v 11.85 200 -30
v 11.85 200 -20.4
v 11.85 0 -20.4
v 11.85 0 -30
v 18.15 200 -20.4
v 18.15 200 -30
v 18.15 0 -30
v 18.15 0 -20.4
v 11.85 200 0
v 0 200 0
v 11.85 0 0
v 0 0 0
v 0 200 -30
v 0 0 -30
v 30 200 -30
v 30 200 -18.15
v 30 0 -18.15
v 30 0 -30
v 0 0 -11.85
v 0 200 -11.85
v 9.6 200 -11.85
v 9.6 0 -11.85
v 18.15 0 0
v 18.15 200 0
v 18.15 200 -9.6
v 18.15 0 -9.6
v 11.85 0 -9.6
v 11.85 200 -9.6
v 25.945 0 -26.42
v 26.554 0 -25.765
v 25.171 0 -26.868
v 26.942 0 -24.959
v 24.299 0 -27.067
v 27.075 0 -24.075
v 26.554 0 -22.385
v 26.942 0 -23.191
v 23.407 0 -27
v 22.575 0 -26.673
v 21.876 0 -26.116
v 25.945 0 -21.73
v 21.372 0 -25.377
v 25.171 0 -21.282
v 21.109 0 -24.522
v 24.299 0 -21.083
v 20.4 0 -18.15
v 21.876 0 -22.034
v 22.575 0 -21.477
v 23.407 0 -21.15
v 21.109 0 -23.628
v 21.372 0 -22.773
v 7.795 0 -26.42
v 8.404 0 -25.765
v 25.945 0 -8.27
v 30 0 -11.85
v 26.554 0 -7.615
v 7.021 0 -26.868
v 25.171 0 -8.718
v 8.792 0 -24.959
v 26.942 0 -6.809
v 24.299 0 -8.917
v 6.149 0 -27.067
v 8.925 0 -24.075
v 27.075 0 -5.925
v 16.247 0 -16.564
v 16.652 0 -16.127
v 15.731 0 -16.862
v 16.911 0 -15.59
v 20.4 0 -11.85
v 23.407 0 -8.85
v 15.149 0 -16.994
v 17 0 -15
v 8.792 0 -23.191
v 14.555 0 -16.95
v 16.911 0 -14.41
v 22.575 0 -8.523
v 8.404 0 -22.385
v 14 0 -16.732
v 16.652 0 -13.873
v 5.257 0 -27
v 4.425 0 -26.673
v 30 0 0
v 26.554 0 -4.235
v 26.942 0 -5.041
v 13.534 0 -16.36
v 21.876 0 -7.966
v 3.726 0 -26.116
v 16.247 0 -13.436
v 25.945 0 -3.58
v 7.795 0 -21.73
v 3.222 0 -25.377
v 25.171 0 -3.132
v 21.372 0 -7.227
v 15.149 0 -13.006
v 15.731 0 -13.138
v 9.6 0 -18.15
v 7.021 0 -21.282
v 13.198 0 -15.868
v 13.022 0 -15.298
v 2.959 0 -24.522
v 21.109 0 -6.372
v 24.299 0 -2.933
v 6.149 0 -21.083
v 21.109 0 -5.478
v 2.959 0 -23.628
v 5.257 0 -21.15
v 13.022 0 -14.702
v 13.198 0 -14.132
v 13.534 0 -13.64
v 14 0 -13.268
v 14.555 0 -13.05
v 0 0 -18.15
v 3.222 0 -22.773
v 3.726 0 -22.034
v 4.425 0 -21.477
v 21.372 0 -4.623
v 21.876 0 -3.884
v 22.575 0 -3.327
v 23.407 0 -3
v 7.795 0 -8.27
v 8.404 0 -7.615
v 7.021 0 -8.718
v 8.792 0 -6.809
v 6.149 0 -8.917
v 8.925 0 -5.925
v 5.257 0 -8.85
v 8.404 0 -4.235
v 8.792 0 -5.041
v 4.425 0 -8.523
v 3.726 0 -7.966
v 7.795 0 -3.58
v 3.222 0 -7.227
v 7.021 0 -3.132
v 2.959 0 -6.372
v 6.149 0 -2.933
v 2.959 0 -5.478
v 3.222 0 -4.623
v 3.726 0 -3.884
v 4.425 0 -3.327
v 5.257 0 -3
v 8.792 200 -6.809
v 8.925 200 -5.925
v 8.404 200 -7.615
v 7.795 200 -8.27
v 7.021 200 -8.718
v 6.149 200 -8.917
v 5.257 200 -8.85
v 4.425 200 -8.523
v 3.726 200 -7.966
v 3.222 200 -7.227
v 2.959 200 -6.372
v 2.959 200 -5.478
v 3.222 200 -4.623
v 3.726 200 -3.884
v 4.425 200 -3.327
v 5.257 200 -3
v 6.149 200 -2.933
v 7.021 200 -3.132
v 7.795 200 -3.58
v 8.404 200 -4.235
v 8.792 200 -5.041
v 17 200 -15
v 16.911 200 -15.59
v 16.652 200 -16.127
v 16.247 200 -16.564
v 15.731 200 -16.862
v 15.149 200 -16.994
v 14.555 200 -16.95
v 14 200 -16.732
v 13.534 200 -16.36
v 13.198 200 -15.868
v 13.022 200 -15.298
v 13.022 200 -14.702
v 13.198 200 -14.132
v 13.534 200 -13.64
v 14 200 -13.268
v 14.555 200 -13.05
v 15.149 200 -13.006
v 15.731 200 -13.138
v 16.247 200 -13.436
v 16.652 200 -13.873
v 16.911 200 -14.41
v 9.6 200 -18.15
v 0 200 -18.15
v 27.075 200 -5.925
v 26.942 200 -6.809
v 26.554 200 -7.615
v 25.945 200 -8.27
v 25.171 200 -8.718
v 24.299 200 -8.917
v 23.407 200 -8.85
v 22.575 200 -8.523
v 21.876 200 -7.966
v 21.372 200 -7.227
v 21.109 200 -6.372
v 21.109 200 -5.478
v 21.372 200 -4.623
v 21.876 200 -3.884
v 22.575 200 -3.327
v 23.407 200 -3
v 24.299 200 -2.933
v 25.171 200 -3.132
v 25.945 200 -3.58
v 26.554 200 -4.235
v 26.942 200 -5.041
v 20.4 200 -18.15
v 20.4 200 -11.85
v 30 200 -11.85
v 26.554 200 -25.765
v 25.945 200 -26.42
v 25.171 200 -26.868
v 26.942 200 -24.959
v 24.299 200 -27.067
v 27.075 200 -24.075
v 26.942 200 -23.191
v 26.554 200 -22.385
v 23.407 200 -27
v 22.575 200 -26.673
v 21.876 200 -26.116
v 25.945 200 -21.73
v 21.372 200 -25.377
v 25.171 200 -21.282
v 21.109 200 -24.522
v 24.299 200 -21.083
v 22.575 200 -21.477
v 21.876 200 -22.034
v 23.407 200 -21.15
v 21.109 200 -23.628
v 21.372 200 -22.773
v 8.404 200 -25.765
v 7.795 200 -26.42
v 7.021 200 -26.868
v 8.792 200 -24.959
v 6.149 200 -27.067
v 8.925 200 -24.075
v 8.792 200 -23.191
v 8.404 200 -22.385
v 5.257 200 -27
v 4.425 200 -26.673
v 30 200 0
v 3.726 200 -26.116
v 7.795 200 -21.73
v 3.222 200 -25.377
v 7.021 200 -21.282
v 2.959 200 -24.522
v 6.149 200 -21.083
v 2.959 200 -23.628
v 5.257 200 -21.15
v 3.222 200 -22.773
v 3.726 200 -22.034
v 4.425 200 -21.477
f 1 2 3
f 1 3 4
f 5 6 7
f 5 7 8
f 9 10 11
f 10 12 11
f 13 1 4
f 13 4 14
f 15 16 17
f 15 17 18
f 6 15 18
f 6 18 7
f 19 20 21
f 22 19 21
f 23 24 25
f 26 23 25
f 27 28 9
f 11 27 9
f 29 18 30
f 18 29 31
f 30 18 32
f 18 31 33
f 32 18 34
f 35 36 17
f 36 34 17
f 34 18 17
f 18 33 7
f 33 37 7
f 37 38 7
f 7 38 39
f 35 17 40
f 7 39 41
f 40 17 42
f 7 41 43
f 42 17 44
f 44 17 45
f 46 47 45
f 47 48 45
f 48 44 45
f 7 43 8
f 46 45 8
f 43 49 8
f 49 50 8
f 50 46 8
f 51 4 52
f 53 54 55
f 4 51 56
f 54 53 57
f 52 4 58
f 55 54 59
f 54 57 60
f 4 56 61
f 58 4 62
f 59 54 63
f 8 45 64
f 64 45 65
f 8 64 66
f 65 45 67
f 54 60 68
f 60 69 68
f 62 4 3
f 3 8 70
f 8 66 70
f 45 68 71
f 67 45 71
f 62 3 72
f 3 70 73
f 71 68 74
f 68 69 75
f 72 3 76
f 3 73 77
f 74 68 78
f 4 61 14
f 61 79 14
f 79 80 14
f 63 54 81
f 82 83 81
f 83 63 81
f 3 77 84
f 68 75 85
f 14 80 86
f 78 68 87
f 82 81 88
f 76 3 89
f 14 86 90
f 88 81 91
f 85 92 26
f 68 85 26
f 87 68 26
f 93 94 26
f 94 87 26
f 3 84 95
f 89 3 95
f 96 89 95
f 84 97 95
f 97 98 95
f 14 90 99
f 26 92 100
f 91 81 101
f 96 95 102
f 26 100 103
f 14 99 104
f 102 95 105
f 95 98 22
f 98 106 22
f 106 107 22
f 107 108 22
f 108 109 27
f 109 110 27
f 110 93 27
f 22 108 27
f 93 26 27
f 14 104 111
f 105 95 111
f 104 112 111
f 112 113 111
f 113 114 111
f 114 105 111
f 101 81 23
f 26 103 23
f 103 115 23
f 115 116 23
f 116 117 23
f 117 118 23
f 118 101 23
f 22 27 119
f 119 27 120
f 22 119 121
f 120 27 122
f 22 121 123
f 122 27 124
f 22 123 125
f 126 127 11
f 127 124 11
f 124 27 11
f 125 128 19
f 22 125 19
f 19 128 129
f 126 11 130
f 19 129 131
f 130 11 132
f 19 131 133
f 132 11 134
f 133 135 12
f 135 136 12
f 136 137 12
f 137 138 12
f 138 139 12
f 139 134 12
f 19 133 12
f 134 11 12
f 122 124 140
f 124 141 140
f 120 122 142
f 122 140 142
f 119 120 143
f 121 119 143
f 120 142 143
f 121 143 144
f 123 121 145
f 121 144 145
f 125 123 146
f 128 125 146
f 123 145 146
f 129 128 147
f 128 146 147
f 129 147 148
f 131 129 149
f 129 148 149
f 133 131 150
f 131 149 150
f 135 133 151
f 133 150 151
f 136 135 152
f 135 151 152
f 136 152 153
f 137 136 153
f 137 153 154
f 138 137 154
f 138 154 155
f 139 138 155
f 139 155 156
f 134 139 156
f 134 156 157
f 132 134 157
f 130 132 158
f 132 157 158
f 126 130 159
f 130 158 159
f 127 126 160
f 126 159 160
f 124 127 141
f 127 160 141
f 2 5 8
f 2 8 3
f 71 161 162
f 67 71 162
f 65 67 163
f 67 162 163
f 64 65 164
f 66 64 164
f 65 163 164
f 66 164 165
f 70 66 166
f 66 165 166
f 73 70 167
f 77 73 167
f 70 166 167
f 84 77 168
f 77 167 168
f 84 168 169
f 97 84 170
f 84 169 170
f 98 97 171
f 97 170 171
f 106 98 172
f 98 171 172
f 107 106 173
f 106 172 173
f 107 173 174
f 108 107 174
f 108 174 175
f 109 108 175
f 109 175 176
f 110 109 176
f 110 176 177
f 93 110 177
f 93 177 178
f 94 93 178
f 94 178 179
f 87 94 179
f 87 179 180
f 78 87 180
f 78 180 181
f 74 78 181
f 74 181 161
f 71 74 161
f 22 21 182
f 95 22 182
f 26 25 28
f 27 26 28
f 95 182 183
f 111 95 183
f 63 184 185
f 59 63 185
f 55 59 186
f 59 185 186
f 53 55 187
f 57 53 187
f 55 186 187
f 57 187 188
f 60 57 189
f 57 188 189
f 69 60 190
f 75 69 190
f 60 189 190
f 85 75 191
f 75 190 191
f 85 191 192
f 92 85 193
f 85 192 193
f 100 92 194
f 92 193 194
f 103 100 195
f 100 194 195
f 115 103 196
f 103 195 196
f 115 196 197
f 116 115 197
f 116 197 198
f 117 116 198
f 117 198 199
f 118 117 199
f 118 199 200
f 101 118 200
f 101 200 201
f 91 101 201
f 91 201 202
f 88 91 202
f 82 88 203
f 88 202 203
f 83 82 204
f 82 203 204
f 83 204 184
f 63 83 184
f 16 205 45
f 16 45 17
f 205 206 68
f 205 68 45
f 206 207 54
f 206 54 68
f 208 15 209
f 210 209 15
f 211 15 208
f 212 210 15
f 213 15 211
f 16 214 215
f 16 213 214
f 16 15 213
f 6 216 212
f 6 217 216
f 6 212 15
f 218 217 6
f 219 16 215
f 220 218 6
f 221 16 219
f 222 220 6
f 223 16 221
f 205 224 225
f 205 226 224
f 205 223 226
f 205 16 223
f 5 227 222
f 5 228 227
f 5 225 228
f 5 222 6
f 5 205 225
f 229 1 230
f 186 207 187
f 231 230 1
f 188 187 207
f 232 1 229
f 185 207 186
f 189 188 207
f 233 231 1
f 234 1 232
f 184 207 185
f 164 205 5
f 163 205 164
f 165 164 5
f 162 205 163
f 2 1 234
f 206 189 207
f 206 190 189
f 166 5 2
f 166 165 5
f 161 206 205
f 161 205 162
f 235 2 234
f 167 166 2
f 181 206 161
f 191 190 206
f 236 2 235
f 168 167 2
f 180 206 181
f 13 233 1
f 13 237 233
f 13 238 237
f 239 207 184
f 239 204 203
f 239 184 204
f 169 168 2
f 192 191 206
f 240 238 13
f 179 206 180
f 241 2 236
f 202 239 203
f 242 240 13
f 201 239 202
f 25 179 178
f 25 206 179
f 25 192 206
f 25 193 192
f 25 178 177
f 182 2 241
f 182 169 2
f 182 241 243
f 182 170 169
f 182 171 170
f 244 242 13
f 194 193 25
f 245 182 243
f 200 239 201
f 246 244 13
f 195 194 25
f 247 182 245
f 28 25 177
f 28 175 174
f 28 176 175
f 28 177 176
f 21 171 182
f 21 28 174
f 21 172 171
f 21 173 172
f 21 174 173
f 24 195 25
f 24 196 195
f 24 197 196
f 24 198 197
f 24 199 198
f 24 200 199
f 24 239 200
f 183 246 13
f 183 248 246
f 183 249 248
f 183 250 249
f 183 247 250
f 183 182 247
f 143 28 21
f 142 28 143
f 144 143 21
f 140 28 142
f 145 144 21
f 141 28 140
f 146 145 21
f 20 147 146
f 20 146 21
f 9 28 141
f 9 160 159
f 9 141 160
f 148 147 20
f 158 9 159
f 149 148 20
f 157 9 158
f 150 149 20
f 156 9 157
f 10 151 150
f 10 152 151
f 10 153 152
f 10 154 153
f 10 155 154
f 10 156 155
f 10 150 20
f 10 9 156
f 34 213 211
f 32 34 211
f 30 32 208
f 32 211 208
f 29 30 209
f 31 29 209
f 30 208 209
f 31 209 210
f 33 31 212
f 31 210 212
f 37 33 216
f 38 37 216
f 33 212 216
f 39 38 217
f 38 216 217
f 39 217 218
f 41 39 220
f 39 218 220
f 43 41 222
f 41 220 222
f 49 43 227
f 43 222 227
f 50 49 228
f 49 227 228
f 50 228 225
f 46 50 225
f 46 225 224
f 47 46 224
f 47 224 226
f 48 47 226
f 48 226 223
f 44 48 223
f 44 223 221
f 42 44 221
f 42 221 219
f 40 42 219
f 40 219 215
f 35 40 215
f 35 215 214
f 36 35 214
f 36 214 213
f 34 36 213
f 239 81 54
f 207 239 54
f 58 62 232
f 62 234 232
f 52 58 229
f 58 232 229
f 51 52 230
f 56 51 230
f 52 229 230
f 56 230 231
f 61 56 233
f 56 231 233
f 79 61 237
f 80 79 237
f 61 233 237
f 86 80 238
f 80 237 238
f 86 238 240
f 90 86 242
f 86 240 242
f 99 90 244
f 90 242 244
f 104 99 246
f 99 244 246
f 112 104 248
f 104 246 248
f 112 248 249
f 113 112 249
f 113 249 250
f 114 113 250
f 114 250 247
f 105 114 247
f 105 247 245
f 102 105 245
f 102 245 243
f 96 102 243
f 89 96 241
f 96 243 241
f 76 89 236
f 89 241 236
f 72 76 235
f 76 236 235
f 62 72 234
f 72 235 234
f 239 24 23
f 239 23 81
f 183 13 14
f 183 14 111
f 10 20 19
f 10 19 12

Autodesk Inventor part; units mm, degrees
ref_plane "YZ Plane" through (0, 0, 0) normal (1, 0, 0) x (0, 1, 0)
ref_plane "XZ Plane" through (0, 0, 0) normal (0, 1, 0) x (-1, 0, 0)
ref_plane "XY Plane" through (0, 0, 0) normal (0, 0, 1) x (1, 0, 0)
sketch "스케치1" plane through (0, 0, 0) normal (0, 1, 0) x (-1, 0, 0)
  line L0 (0, 0) -> (-30, 0)
  line L1 (-30, 0) -> (-30, -30)
  line L2 (-30, -30) -> (0, -30)
  line L3 (0, -30) -> (0, 0)
  dimension "d0" = 30
  dimension "d1" = 30
extrude "돌출1" add sketch "스케치1" along normal blind 200
sketch "스케치6" plane through (0, 200, 0) normal (0, 1, 0) x (1, 0, 0)
  line L0 (0, 11.85) -> (9.6, 11.85)
  line L1 (9.6, 11.85) -> (9.6, 18.15)
  line L2 (9.6, 18.15) -> (0, 18.15)
  line L3 (0, 18.15) -> (0, 11.85)
  line L4 (0, 30) -> (0, 0) projected
  line L5 (0, 0) -> (30, 0) construction
  line L6 (15, 0) -> (15, 30) construction
  line L7 (30, 30) -> (0, 30) construction
  line L8 (0, 15) -> (30, 15) construction
  line L9 (11.85, 0) -> (18.15, 0)
  line L10 (18.15, 0) -> (18.15, 9.6)
  line L11 (18.15, 9.6) -> (11.85, 9.6)
  line L12 (11.85, 9.6) -> (11.85, 0)
  line L13 (0, 30) -> (30, 30) construction
  line L14 (11.85, 30) -> (18.15, 30)
  line L15 (18.15, 30) -> (18.15, 20.4)
  line L16 (18.15, 20.4) -> (11.85, 20.4)
  line L17 (11.85, 20.4) -> (11.85, 30)
  line L18 (30, 11.85) -> (20.4, 11.85)
  line L19 (20.4, 11.85) -> (20.4, 18.15)
  line L20 (20.4, 18.15) -> (30, 18.15)
  line L21 (30, 18.15) -> (30, 11.85)
  dimension "d15" = 6.3
  dimension "d16" = 9.6
  dimension "d17" = 9.6
  dimension "d18" = 6.3
extrude "돌출4" cut sketch "스케치6" against normal blind 500
sketch "스케치7" plane through (0, 200, 0) normal (0, 1, 0) x (1, 0, 0)
  circle A0 centre (5.925, 5.925) radius 3
  circle A1 centre (5.925, 24.075) radius 3
  circle A2 centre (24.075, 24.075) radius 3
  circle A3 centre (24.075, 5.925) radius 3
  circle A4 centre (15, 15) radius 2
  line L0 (0, 0) -> (11.85, 0) projected
  line L1 (0, 11.85) -> (0, 0) projected
  line L2 (11.85, 30) -> (0, 30) projected
  line L3 (30, 18.15) -> (30, 30) projected
  line L4 (9.6, 18.15) -> (9.6, 11.85) projected
  line L5 (18.15, 20.4) -> (11.85, 20.4) projected
  point P0 (9.6, 15)
  point P1 (15, 20.4)
  dimension "d21" = 6
  dimension "d22" = 6
  dimension "d23" = 6
  dimension "d24" = 6
  dimension "d25" = 5.925
  dimension "d26" = 5.925
  dimension "d27" = 5.925
  dimension "d28" = 5.925
  dimension "d29" = 4
extrude "돌출5" cut sketch "스케치7" against normal blind 200
properties part number "3030column"
